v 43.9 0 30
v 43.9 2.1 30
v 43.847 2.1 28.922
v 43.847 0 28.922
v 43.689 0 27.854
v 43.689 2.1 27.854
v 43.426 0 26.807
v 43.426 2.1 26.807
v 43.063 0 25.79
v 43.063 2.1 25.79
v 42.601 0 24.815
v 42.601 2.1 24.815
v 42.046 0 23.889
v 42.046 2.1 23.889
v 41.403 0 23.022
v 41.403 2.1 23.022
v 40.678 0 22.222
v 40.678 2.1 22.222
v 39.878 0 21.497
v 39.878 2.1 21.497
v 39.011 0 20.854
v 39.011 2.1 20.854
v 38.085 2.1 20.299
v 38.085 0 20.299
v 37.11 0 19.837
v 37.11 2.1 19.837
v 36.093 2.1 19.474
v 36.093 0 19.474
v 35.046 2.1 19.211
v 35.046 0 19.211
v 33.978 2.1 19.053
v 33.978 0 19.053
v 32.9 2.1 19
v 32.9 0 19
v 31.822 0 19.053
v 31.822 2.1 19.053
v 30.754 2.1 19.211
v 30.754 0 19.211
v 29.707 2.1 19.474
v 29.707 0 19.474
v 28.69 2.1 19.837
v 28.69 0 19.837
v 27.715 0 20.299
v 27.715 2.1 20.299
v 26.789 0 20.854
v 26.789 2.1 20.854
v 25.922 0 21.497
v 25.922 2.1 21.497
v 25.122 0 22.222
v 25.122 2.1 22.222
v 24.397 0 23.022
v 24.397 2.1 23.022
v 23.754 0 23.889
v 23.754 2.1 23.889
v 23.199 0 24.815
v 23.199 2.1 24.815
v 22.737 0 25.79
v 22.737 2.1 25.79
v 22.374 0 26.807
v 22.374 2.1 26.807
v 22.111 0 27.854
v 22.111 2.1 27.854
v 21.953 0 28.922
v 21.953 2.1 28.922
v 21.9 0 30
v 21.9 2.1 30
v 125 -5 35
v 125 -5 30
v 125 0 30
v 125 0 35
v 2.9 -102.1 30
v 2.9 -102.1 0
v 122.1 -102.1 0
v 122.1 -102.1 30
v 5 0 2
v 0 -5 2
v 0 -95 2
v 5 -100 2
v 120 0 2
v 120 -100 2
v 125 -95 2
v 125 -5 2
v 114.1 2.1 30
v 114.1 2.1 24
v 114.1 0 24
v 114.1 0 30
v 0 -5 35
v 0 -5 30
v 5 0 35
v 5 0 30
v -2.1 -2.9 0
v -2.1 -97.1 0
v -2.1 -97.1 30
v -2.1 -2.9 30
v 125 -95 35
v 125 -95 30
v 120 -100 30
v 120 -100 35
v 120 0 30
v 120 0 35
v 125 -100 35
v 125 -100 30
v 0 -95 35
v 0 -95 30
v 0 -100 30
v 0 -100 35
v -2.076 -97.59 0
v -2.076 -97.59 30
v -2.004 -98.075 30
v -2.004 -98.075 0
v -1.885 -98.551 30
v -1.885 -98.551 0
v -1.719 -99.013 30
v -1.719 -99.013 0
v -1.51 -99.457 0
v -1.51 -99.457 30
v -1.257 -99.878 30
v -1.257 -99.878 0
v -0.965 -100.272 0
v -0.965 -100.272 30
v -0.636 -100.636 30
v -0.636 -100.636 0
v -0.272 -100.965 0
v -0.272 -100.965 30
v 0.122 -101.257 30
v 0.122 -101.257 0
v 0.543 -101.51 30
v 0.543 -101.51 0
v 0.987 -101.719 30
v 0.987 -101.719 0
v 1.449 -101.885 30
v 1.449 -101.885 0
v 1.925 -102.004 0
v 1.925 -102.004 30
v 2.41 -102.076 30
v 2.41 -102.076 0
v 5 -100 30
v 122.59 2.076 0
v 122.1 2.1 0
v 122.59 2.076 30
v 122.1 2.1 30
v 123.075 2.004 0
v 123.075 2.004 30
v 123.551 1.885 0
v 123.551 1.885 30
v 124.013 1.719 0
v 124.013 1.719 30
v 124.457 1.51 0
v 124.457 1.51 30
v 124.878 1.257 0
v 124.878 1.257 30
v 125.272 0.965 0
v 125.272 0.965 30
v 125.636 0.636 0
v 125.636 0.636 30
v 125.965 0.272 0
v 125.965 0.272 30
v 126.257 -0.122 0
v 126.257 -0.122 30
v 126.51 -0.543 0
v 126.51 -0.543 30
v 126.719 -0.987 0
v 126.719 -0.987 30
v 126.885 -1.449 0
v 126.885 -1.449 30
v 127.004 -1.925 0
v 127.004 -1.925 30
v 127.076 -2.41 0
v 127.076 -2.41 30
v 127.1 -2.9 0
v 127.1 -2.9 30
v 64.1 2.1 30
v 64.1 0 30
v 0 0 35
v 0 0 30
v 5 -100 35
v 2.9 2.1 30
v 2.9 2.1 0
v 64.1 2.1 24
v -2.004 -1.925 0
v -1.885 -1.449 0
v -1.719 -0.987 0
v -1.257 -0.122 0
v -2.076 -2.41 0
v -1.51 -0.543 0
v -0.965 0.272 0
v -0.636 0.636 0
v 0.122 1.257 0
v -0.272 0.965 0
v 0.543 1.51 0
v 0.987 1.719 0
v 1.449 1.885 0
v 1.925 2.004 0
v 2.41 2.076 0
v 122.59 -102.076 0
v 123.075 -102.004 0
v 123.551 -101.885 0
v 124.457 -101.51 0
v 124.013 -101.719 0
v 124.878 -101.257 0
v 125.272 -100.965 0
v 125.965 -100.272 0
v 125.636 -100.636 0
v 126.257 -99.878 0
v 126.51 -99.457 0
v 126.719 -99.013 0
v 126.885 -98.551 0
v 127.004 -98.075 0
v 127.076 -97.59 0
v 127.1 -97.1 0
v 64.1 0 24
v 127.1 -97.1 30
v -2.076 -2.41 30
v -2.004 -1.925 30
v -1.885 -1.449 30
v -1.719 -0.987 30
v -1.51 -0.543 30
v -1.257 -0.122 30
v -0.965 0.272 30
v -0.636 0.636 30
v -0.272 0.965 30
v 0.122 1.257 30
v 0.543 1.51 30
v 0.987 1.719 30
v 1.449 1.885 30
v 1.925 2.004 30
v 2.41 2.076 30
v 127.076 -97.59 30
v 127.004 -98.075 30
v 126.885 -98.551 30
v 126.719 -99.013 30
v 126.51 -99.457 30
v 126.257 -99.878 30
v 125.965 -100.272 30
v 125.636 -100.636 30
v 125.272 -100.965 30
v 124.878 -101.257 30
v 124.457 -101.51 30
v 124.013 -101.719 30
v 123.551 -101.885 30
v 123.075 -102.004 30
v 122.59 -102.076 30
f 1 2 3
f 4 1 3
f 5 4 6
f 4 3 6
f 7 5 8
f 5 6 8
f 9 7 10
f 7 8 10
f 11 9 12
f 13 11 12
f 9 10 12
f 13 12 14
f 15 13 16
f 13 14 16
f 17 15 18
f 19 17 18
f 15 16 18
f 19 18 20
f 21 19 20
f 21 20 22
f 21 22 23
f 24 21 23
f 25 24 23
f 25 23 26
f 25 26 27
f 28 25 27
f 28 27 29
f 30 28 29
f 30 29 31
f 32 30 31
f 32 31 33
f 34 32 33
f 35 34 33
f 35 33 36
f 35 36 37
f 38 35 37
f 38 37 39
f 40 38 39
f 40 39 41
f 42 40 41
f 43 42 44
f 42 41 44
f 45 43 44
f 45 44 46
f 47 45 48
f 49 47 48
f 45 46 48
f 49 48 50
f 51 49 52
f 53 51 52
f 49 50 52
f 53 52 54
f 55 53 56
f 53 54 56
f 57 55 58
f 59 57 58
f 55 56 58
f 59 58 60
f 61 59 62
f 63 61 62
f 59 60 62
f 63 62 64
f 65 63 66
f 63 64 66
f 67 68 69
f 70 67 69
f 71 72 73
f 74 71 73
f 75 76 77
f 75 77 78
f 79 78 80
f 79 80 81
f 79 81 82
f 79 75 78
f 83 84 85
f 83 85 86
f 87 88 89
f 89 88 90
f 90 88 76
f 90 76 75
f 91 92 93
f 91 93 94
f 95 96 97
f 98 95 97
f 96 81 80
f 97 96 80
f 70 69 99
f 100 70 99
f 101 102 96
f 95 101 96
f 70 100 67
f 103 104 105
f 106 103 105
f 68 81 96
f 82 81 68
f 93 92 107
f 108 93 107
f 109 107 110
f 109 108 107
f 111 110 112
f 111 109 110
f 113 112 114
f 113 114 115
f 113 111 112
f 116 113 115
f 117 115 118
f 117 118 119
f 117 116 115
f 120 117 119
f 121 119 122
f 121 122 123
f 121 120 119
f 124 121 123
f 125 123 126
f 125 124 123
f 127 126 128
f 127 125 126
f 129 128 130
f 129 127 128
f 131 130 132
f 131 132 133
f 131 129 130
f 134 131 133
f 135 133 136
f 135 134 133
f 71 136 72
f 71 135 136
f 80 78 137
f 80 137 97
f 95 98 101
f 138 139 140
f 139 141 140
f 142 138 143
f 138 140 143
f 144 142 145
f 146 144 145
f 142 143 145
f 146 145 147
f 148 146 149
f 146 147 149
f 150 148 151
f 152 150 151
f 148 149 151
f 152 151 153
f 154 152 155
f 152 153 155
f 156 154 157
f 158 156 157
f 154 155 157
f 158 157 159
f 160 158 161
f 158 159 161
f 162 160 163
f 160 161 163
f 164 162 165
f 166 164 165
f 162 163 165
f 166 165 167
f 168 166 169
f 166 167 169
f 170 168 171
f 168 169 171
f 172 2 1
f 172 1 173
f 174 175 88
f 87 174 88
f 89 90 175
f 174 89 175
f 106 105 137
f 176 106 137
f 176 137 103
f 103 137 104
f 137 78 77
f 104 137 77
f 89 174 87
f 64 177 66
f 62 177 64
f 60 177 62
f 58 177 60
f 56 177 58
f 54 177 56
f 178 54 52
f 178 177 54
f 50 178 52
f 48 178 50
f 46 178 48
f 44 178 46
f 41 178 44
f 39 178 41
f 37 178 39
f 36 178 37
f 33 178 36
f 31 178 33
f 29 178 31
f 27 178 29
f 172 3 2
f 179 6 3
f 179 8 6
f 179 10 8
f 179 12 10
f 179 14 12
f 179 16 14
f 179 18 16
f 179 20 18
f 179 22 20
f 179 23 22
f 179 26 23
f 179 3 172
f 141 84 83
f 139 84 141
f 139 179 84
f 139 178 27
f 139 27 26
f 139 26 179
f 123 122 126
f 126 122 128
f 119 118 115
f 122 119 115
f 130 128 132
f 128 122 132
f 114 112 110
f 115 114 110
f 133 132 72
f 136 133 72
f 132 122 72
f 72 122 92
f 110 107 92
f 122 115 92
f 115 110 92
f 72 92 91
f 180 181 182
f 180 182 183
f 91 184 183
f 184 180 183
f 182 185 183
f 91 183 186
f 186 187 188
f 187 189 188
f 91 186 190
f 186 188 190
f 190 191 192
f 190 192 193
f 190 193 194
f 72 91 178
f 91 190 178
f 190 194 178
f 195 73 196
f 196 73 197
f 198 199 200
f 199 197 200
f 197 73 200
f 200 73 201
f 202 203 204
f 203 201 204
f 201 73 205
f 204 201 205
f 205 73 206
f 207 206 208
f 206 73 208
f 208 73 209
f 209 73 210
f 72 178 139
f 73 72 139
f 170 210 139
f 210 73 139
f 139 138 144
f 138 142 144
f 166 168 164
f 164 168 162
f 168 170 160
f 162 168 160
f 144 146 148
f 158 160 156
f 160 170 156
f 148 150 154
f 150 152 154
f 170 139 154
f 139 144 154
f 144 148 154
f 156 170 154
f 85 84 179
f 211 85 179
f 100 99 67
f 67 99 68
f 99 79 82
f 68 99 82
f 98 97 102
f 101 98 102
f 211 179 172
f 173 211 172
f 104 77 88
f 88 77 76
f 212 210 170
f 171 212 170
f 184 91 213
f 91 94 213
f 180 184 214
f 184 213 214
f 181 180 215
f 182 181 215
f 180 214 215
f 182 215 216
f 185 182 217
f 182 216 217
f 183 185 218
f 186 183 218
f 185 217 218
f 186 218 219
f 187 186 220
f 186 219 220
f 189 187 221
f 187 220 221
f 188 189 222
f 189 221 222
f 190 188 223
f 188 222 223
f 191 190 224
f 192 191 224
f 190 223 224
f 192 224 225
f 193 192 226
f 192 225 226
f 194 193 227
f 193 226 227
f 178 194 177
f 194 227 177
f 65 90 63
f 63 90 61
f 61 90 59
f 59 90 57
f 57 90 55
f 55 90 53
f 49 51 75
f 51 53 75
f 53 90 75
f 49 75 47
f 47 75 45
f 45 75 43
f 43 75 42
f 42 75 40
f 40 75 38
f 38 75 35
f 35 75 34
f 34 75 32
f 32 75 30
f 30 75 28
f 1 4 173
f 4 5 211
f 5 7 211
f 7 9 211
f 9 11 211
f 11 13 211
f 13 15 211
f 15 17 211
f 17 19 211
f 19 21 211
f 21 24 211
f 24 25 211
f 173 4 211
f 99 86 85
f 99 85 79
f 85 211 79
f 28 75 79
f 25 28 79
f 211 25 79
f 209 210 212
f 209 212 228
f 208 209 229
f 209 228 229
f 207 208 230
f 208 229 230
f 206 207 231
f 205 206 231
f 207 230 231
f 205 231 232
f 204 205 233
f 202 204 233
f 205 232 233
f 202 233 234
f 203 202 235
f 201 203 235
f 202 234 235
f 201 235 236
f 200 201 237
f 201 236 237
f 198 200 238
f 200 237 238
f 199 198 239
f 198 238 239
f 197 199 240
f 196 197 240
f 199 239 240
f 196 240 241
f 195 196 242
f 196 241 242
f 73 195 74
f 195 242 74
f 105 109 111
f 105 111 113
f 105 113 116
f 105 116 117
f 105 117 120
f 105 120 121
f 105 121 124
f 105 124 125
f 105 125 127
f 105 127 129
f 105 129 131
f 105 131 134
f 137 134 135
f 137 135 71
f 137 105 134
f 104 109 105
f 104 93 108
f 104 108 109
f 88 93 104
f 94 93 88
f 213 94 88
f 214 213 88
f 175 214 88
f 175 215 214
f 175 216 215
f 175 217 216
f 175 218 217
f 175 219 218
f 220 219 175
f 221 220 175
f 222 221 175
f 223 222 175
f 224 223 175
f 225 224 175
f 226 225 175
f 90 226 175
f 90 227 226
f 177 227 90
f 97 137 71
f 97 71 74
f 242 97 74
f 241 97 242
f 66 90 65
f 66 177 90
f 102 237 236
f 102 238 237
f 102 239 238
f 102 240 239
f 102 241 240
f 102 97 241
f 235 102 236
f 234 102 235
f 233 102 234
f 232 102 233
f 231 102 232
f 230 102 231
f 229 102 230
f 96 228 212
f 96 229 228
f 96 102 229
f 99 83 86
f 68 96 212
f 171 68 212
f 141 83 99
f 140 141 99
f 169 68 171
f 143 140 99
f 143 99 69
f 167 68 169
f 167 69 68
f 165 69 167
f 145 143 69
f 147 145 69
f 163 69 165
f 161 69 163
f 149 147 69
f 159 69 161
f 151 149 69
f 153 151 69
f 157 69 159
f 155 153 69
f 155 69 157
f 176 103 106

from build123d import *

# Parameters (mm, degrees)
F0_W     = 125
F0_H     = 100
F1_DEPTH = 2
F2_W     = 129.2
F2_H     = 104.2
F2_W_2   = 125
F2_H_2   = 100
F3_DEPTH = 30
F4_R     = 11
F4_W     = 50
F4_H     = 12
F5_DEPTH = 5
F7_DEPTH = 33
F8_R     = 5


with BuildPart() as f1:
    # F0 (on Top) → F1 (new body)
    with BuildSketch(Plane.XY):
        with Locations((62.5, -50)):
            Rectangle(F0_W, F0_H)
    extrude(amount=F1_DEPTH)

    # F2 (on Top) → F3 (join)
    with BuildSketch(Plane.XY):
        with Locations((62.5, -50)):
            Rectangle(F2_W, F2_H)
        with Locations((62.5, -50)):
            Rectangle(F2_W_2, F2_H_2, mode=Mode.SUBTRACT)
    extrude(amount=F3_DEPTH)

    # F4 (on face) → F5 (cut)
    with BuildSketch(Plane(origin=(0, 2.1, 0), x_dir=(-1, 0, 0), z_dir=(0, 1, 0))):
        with Locations((-32.9, 30)):
            Circle(F4_R)
        with Locations((-89.1, 30)):
            Rectangle(F4_W, F4_H)
    extrude(amount=-F5_DEPTH, mode=Mode.SUBTRACT)

    # F6 (on face) → F7 (join)
    with BuildSketch(Plane.XY.offset(2)):
        Polygon((5, 0), (0, 0), (0, -5), align=None)
        Polygon((125, -5), (125, 0), (120, 0), align=None)
        Polygon((120, -100), (125, -100), (125, -95), align=None)
        Polygon((0, -95), (0, -100), (5, -100), align=None)
    extrude(amount=F7_DEPTH)

    # F8
    f8_edges = [f1.edges().sort_by_distance(p)[0] for p in [
        (-2.1, -102.1, 15),
        (127.1, -102.1, 15),
        (127.1, 2.1, 15),
        (-2.1, 2.1, 15),
    ]]
    fillet(f8_edges, radius=F8_R)


solid = f1.part
